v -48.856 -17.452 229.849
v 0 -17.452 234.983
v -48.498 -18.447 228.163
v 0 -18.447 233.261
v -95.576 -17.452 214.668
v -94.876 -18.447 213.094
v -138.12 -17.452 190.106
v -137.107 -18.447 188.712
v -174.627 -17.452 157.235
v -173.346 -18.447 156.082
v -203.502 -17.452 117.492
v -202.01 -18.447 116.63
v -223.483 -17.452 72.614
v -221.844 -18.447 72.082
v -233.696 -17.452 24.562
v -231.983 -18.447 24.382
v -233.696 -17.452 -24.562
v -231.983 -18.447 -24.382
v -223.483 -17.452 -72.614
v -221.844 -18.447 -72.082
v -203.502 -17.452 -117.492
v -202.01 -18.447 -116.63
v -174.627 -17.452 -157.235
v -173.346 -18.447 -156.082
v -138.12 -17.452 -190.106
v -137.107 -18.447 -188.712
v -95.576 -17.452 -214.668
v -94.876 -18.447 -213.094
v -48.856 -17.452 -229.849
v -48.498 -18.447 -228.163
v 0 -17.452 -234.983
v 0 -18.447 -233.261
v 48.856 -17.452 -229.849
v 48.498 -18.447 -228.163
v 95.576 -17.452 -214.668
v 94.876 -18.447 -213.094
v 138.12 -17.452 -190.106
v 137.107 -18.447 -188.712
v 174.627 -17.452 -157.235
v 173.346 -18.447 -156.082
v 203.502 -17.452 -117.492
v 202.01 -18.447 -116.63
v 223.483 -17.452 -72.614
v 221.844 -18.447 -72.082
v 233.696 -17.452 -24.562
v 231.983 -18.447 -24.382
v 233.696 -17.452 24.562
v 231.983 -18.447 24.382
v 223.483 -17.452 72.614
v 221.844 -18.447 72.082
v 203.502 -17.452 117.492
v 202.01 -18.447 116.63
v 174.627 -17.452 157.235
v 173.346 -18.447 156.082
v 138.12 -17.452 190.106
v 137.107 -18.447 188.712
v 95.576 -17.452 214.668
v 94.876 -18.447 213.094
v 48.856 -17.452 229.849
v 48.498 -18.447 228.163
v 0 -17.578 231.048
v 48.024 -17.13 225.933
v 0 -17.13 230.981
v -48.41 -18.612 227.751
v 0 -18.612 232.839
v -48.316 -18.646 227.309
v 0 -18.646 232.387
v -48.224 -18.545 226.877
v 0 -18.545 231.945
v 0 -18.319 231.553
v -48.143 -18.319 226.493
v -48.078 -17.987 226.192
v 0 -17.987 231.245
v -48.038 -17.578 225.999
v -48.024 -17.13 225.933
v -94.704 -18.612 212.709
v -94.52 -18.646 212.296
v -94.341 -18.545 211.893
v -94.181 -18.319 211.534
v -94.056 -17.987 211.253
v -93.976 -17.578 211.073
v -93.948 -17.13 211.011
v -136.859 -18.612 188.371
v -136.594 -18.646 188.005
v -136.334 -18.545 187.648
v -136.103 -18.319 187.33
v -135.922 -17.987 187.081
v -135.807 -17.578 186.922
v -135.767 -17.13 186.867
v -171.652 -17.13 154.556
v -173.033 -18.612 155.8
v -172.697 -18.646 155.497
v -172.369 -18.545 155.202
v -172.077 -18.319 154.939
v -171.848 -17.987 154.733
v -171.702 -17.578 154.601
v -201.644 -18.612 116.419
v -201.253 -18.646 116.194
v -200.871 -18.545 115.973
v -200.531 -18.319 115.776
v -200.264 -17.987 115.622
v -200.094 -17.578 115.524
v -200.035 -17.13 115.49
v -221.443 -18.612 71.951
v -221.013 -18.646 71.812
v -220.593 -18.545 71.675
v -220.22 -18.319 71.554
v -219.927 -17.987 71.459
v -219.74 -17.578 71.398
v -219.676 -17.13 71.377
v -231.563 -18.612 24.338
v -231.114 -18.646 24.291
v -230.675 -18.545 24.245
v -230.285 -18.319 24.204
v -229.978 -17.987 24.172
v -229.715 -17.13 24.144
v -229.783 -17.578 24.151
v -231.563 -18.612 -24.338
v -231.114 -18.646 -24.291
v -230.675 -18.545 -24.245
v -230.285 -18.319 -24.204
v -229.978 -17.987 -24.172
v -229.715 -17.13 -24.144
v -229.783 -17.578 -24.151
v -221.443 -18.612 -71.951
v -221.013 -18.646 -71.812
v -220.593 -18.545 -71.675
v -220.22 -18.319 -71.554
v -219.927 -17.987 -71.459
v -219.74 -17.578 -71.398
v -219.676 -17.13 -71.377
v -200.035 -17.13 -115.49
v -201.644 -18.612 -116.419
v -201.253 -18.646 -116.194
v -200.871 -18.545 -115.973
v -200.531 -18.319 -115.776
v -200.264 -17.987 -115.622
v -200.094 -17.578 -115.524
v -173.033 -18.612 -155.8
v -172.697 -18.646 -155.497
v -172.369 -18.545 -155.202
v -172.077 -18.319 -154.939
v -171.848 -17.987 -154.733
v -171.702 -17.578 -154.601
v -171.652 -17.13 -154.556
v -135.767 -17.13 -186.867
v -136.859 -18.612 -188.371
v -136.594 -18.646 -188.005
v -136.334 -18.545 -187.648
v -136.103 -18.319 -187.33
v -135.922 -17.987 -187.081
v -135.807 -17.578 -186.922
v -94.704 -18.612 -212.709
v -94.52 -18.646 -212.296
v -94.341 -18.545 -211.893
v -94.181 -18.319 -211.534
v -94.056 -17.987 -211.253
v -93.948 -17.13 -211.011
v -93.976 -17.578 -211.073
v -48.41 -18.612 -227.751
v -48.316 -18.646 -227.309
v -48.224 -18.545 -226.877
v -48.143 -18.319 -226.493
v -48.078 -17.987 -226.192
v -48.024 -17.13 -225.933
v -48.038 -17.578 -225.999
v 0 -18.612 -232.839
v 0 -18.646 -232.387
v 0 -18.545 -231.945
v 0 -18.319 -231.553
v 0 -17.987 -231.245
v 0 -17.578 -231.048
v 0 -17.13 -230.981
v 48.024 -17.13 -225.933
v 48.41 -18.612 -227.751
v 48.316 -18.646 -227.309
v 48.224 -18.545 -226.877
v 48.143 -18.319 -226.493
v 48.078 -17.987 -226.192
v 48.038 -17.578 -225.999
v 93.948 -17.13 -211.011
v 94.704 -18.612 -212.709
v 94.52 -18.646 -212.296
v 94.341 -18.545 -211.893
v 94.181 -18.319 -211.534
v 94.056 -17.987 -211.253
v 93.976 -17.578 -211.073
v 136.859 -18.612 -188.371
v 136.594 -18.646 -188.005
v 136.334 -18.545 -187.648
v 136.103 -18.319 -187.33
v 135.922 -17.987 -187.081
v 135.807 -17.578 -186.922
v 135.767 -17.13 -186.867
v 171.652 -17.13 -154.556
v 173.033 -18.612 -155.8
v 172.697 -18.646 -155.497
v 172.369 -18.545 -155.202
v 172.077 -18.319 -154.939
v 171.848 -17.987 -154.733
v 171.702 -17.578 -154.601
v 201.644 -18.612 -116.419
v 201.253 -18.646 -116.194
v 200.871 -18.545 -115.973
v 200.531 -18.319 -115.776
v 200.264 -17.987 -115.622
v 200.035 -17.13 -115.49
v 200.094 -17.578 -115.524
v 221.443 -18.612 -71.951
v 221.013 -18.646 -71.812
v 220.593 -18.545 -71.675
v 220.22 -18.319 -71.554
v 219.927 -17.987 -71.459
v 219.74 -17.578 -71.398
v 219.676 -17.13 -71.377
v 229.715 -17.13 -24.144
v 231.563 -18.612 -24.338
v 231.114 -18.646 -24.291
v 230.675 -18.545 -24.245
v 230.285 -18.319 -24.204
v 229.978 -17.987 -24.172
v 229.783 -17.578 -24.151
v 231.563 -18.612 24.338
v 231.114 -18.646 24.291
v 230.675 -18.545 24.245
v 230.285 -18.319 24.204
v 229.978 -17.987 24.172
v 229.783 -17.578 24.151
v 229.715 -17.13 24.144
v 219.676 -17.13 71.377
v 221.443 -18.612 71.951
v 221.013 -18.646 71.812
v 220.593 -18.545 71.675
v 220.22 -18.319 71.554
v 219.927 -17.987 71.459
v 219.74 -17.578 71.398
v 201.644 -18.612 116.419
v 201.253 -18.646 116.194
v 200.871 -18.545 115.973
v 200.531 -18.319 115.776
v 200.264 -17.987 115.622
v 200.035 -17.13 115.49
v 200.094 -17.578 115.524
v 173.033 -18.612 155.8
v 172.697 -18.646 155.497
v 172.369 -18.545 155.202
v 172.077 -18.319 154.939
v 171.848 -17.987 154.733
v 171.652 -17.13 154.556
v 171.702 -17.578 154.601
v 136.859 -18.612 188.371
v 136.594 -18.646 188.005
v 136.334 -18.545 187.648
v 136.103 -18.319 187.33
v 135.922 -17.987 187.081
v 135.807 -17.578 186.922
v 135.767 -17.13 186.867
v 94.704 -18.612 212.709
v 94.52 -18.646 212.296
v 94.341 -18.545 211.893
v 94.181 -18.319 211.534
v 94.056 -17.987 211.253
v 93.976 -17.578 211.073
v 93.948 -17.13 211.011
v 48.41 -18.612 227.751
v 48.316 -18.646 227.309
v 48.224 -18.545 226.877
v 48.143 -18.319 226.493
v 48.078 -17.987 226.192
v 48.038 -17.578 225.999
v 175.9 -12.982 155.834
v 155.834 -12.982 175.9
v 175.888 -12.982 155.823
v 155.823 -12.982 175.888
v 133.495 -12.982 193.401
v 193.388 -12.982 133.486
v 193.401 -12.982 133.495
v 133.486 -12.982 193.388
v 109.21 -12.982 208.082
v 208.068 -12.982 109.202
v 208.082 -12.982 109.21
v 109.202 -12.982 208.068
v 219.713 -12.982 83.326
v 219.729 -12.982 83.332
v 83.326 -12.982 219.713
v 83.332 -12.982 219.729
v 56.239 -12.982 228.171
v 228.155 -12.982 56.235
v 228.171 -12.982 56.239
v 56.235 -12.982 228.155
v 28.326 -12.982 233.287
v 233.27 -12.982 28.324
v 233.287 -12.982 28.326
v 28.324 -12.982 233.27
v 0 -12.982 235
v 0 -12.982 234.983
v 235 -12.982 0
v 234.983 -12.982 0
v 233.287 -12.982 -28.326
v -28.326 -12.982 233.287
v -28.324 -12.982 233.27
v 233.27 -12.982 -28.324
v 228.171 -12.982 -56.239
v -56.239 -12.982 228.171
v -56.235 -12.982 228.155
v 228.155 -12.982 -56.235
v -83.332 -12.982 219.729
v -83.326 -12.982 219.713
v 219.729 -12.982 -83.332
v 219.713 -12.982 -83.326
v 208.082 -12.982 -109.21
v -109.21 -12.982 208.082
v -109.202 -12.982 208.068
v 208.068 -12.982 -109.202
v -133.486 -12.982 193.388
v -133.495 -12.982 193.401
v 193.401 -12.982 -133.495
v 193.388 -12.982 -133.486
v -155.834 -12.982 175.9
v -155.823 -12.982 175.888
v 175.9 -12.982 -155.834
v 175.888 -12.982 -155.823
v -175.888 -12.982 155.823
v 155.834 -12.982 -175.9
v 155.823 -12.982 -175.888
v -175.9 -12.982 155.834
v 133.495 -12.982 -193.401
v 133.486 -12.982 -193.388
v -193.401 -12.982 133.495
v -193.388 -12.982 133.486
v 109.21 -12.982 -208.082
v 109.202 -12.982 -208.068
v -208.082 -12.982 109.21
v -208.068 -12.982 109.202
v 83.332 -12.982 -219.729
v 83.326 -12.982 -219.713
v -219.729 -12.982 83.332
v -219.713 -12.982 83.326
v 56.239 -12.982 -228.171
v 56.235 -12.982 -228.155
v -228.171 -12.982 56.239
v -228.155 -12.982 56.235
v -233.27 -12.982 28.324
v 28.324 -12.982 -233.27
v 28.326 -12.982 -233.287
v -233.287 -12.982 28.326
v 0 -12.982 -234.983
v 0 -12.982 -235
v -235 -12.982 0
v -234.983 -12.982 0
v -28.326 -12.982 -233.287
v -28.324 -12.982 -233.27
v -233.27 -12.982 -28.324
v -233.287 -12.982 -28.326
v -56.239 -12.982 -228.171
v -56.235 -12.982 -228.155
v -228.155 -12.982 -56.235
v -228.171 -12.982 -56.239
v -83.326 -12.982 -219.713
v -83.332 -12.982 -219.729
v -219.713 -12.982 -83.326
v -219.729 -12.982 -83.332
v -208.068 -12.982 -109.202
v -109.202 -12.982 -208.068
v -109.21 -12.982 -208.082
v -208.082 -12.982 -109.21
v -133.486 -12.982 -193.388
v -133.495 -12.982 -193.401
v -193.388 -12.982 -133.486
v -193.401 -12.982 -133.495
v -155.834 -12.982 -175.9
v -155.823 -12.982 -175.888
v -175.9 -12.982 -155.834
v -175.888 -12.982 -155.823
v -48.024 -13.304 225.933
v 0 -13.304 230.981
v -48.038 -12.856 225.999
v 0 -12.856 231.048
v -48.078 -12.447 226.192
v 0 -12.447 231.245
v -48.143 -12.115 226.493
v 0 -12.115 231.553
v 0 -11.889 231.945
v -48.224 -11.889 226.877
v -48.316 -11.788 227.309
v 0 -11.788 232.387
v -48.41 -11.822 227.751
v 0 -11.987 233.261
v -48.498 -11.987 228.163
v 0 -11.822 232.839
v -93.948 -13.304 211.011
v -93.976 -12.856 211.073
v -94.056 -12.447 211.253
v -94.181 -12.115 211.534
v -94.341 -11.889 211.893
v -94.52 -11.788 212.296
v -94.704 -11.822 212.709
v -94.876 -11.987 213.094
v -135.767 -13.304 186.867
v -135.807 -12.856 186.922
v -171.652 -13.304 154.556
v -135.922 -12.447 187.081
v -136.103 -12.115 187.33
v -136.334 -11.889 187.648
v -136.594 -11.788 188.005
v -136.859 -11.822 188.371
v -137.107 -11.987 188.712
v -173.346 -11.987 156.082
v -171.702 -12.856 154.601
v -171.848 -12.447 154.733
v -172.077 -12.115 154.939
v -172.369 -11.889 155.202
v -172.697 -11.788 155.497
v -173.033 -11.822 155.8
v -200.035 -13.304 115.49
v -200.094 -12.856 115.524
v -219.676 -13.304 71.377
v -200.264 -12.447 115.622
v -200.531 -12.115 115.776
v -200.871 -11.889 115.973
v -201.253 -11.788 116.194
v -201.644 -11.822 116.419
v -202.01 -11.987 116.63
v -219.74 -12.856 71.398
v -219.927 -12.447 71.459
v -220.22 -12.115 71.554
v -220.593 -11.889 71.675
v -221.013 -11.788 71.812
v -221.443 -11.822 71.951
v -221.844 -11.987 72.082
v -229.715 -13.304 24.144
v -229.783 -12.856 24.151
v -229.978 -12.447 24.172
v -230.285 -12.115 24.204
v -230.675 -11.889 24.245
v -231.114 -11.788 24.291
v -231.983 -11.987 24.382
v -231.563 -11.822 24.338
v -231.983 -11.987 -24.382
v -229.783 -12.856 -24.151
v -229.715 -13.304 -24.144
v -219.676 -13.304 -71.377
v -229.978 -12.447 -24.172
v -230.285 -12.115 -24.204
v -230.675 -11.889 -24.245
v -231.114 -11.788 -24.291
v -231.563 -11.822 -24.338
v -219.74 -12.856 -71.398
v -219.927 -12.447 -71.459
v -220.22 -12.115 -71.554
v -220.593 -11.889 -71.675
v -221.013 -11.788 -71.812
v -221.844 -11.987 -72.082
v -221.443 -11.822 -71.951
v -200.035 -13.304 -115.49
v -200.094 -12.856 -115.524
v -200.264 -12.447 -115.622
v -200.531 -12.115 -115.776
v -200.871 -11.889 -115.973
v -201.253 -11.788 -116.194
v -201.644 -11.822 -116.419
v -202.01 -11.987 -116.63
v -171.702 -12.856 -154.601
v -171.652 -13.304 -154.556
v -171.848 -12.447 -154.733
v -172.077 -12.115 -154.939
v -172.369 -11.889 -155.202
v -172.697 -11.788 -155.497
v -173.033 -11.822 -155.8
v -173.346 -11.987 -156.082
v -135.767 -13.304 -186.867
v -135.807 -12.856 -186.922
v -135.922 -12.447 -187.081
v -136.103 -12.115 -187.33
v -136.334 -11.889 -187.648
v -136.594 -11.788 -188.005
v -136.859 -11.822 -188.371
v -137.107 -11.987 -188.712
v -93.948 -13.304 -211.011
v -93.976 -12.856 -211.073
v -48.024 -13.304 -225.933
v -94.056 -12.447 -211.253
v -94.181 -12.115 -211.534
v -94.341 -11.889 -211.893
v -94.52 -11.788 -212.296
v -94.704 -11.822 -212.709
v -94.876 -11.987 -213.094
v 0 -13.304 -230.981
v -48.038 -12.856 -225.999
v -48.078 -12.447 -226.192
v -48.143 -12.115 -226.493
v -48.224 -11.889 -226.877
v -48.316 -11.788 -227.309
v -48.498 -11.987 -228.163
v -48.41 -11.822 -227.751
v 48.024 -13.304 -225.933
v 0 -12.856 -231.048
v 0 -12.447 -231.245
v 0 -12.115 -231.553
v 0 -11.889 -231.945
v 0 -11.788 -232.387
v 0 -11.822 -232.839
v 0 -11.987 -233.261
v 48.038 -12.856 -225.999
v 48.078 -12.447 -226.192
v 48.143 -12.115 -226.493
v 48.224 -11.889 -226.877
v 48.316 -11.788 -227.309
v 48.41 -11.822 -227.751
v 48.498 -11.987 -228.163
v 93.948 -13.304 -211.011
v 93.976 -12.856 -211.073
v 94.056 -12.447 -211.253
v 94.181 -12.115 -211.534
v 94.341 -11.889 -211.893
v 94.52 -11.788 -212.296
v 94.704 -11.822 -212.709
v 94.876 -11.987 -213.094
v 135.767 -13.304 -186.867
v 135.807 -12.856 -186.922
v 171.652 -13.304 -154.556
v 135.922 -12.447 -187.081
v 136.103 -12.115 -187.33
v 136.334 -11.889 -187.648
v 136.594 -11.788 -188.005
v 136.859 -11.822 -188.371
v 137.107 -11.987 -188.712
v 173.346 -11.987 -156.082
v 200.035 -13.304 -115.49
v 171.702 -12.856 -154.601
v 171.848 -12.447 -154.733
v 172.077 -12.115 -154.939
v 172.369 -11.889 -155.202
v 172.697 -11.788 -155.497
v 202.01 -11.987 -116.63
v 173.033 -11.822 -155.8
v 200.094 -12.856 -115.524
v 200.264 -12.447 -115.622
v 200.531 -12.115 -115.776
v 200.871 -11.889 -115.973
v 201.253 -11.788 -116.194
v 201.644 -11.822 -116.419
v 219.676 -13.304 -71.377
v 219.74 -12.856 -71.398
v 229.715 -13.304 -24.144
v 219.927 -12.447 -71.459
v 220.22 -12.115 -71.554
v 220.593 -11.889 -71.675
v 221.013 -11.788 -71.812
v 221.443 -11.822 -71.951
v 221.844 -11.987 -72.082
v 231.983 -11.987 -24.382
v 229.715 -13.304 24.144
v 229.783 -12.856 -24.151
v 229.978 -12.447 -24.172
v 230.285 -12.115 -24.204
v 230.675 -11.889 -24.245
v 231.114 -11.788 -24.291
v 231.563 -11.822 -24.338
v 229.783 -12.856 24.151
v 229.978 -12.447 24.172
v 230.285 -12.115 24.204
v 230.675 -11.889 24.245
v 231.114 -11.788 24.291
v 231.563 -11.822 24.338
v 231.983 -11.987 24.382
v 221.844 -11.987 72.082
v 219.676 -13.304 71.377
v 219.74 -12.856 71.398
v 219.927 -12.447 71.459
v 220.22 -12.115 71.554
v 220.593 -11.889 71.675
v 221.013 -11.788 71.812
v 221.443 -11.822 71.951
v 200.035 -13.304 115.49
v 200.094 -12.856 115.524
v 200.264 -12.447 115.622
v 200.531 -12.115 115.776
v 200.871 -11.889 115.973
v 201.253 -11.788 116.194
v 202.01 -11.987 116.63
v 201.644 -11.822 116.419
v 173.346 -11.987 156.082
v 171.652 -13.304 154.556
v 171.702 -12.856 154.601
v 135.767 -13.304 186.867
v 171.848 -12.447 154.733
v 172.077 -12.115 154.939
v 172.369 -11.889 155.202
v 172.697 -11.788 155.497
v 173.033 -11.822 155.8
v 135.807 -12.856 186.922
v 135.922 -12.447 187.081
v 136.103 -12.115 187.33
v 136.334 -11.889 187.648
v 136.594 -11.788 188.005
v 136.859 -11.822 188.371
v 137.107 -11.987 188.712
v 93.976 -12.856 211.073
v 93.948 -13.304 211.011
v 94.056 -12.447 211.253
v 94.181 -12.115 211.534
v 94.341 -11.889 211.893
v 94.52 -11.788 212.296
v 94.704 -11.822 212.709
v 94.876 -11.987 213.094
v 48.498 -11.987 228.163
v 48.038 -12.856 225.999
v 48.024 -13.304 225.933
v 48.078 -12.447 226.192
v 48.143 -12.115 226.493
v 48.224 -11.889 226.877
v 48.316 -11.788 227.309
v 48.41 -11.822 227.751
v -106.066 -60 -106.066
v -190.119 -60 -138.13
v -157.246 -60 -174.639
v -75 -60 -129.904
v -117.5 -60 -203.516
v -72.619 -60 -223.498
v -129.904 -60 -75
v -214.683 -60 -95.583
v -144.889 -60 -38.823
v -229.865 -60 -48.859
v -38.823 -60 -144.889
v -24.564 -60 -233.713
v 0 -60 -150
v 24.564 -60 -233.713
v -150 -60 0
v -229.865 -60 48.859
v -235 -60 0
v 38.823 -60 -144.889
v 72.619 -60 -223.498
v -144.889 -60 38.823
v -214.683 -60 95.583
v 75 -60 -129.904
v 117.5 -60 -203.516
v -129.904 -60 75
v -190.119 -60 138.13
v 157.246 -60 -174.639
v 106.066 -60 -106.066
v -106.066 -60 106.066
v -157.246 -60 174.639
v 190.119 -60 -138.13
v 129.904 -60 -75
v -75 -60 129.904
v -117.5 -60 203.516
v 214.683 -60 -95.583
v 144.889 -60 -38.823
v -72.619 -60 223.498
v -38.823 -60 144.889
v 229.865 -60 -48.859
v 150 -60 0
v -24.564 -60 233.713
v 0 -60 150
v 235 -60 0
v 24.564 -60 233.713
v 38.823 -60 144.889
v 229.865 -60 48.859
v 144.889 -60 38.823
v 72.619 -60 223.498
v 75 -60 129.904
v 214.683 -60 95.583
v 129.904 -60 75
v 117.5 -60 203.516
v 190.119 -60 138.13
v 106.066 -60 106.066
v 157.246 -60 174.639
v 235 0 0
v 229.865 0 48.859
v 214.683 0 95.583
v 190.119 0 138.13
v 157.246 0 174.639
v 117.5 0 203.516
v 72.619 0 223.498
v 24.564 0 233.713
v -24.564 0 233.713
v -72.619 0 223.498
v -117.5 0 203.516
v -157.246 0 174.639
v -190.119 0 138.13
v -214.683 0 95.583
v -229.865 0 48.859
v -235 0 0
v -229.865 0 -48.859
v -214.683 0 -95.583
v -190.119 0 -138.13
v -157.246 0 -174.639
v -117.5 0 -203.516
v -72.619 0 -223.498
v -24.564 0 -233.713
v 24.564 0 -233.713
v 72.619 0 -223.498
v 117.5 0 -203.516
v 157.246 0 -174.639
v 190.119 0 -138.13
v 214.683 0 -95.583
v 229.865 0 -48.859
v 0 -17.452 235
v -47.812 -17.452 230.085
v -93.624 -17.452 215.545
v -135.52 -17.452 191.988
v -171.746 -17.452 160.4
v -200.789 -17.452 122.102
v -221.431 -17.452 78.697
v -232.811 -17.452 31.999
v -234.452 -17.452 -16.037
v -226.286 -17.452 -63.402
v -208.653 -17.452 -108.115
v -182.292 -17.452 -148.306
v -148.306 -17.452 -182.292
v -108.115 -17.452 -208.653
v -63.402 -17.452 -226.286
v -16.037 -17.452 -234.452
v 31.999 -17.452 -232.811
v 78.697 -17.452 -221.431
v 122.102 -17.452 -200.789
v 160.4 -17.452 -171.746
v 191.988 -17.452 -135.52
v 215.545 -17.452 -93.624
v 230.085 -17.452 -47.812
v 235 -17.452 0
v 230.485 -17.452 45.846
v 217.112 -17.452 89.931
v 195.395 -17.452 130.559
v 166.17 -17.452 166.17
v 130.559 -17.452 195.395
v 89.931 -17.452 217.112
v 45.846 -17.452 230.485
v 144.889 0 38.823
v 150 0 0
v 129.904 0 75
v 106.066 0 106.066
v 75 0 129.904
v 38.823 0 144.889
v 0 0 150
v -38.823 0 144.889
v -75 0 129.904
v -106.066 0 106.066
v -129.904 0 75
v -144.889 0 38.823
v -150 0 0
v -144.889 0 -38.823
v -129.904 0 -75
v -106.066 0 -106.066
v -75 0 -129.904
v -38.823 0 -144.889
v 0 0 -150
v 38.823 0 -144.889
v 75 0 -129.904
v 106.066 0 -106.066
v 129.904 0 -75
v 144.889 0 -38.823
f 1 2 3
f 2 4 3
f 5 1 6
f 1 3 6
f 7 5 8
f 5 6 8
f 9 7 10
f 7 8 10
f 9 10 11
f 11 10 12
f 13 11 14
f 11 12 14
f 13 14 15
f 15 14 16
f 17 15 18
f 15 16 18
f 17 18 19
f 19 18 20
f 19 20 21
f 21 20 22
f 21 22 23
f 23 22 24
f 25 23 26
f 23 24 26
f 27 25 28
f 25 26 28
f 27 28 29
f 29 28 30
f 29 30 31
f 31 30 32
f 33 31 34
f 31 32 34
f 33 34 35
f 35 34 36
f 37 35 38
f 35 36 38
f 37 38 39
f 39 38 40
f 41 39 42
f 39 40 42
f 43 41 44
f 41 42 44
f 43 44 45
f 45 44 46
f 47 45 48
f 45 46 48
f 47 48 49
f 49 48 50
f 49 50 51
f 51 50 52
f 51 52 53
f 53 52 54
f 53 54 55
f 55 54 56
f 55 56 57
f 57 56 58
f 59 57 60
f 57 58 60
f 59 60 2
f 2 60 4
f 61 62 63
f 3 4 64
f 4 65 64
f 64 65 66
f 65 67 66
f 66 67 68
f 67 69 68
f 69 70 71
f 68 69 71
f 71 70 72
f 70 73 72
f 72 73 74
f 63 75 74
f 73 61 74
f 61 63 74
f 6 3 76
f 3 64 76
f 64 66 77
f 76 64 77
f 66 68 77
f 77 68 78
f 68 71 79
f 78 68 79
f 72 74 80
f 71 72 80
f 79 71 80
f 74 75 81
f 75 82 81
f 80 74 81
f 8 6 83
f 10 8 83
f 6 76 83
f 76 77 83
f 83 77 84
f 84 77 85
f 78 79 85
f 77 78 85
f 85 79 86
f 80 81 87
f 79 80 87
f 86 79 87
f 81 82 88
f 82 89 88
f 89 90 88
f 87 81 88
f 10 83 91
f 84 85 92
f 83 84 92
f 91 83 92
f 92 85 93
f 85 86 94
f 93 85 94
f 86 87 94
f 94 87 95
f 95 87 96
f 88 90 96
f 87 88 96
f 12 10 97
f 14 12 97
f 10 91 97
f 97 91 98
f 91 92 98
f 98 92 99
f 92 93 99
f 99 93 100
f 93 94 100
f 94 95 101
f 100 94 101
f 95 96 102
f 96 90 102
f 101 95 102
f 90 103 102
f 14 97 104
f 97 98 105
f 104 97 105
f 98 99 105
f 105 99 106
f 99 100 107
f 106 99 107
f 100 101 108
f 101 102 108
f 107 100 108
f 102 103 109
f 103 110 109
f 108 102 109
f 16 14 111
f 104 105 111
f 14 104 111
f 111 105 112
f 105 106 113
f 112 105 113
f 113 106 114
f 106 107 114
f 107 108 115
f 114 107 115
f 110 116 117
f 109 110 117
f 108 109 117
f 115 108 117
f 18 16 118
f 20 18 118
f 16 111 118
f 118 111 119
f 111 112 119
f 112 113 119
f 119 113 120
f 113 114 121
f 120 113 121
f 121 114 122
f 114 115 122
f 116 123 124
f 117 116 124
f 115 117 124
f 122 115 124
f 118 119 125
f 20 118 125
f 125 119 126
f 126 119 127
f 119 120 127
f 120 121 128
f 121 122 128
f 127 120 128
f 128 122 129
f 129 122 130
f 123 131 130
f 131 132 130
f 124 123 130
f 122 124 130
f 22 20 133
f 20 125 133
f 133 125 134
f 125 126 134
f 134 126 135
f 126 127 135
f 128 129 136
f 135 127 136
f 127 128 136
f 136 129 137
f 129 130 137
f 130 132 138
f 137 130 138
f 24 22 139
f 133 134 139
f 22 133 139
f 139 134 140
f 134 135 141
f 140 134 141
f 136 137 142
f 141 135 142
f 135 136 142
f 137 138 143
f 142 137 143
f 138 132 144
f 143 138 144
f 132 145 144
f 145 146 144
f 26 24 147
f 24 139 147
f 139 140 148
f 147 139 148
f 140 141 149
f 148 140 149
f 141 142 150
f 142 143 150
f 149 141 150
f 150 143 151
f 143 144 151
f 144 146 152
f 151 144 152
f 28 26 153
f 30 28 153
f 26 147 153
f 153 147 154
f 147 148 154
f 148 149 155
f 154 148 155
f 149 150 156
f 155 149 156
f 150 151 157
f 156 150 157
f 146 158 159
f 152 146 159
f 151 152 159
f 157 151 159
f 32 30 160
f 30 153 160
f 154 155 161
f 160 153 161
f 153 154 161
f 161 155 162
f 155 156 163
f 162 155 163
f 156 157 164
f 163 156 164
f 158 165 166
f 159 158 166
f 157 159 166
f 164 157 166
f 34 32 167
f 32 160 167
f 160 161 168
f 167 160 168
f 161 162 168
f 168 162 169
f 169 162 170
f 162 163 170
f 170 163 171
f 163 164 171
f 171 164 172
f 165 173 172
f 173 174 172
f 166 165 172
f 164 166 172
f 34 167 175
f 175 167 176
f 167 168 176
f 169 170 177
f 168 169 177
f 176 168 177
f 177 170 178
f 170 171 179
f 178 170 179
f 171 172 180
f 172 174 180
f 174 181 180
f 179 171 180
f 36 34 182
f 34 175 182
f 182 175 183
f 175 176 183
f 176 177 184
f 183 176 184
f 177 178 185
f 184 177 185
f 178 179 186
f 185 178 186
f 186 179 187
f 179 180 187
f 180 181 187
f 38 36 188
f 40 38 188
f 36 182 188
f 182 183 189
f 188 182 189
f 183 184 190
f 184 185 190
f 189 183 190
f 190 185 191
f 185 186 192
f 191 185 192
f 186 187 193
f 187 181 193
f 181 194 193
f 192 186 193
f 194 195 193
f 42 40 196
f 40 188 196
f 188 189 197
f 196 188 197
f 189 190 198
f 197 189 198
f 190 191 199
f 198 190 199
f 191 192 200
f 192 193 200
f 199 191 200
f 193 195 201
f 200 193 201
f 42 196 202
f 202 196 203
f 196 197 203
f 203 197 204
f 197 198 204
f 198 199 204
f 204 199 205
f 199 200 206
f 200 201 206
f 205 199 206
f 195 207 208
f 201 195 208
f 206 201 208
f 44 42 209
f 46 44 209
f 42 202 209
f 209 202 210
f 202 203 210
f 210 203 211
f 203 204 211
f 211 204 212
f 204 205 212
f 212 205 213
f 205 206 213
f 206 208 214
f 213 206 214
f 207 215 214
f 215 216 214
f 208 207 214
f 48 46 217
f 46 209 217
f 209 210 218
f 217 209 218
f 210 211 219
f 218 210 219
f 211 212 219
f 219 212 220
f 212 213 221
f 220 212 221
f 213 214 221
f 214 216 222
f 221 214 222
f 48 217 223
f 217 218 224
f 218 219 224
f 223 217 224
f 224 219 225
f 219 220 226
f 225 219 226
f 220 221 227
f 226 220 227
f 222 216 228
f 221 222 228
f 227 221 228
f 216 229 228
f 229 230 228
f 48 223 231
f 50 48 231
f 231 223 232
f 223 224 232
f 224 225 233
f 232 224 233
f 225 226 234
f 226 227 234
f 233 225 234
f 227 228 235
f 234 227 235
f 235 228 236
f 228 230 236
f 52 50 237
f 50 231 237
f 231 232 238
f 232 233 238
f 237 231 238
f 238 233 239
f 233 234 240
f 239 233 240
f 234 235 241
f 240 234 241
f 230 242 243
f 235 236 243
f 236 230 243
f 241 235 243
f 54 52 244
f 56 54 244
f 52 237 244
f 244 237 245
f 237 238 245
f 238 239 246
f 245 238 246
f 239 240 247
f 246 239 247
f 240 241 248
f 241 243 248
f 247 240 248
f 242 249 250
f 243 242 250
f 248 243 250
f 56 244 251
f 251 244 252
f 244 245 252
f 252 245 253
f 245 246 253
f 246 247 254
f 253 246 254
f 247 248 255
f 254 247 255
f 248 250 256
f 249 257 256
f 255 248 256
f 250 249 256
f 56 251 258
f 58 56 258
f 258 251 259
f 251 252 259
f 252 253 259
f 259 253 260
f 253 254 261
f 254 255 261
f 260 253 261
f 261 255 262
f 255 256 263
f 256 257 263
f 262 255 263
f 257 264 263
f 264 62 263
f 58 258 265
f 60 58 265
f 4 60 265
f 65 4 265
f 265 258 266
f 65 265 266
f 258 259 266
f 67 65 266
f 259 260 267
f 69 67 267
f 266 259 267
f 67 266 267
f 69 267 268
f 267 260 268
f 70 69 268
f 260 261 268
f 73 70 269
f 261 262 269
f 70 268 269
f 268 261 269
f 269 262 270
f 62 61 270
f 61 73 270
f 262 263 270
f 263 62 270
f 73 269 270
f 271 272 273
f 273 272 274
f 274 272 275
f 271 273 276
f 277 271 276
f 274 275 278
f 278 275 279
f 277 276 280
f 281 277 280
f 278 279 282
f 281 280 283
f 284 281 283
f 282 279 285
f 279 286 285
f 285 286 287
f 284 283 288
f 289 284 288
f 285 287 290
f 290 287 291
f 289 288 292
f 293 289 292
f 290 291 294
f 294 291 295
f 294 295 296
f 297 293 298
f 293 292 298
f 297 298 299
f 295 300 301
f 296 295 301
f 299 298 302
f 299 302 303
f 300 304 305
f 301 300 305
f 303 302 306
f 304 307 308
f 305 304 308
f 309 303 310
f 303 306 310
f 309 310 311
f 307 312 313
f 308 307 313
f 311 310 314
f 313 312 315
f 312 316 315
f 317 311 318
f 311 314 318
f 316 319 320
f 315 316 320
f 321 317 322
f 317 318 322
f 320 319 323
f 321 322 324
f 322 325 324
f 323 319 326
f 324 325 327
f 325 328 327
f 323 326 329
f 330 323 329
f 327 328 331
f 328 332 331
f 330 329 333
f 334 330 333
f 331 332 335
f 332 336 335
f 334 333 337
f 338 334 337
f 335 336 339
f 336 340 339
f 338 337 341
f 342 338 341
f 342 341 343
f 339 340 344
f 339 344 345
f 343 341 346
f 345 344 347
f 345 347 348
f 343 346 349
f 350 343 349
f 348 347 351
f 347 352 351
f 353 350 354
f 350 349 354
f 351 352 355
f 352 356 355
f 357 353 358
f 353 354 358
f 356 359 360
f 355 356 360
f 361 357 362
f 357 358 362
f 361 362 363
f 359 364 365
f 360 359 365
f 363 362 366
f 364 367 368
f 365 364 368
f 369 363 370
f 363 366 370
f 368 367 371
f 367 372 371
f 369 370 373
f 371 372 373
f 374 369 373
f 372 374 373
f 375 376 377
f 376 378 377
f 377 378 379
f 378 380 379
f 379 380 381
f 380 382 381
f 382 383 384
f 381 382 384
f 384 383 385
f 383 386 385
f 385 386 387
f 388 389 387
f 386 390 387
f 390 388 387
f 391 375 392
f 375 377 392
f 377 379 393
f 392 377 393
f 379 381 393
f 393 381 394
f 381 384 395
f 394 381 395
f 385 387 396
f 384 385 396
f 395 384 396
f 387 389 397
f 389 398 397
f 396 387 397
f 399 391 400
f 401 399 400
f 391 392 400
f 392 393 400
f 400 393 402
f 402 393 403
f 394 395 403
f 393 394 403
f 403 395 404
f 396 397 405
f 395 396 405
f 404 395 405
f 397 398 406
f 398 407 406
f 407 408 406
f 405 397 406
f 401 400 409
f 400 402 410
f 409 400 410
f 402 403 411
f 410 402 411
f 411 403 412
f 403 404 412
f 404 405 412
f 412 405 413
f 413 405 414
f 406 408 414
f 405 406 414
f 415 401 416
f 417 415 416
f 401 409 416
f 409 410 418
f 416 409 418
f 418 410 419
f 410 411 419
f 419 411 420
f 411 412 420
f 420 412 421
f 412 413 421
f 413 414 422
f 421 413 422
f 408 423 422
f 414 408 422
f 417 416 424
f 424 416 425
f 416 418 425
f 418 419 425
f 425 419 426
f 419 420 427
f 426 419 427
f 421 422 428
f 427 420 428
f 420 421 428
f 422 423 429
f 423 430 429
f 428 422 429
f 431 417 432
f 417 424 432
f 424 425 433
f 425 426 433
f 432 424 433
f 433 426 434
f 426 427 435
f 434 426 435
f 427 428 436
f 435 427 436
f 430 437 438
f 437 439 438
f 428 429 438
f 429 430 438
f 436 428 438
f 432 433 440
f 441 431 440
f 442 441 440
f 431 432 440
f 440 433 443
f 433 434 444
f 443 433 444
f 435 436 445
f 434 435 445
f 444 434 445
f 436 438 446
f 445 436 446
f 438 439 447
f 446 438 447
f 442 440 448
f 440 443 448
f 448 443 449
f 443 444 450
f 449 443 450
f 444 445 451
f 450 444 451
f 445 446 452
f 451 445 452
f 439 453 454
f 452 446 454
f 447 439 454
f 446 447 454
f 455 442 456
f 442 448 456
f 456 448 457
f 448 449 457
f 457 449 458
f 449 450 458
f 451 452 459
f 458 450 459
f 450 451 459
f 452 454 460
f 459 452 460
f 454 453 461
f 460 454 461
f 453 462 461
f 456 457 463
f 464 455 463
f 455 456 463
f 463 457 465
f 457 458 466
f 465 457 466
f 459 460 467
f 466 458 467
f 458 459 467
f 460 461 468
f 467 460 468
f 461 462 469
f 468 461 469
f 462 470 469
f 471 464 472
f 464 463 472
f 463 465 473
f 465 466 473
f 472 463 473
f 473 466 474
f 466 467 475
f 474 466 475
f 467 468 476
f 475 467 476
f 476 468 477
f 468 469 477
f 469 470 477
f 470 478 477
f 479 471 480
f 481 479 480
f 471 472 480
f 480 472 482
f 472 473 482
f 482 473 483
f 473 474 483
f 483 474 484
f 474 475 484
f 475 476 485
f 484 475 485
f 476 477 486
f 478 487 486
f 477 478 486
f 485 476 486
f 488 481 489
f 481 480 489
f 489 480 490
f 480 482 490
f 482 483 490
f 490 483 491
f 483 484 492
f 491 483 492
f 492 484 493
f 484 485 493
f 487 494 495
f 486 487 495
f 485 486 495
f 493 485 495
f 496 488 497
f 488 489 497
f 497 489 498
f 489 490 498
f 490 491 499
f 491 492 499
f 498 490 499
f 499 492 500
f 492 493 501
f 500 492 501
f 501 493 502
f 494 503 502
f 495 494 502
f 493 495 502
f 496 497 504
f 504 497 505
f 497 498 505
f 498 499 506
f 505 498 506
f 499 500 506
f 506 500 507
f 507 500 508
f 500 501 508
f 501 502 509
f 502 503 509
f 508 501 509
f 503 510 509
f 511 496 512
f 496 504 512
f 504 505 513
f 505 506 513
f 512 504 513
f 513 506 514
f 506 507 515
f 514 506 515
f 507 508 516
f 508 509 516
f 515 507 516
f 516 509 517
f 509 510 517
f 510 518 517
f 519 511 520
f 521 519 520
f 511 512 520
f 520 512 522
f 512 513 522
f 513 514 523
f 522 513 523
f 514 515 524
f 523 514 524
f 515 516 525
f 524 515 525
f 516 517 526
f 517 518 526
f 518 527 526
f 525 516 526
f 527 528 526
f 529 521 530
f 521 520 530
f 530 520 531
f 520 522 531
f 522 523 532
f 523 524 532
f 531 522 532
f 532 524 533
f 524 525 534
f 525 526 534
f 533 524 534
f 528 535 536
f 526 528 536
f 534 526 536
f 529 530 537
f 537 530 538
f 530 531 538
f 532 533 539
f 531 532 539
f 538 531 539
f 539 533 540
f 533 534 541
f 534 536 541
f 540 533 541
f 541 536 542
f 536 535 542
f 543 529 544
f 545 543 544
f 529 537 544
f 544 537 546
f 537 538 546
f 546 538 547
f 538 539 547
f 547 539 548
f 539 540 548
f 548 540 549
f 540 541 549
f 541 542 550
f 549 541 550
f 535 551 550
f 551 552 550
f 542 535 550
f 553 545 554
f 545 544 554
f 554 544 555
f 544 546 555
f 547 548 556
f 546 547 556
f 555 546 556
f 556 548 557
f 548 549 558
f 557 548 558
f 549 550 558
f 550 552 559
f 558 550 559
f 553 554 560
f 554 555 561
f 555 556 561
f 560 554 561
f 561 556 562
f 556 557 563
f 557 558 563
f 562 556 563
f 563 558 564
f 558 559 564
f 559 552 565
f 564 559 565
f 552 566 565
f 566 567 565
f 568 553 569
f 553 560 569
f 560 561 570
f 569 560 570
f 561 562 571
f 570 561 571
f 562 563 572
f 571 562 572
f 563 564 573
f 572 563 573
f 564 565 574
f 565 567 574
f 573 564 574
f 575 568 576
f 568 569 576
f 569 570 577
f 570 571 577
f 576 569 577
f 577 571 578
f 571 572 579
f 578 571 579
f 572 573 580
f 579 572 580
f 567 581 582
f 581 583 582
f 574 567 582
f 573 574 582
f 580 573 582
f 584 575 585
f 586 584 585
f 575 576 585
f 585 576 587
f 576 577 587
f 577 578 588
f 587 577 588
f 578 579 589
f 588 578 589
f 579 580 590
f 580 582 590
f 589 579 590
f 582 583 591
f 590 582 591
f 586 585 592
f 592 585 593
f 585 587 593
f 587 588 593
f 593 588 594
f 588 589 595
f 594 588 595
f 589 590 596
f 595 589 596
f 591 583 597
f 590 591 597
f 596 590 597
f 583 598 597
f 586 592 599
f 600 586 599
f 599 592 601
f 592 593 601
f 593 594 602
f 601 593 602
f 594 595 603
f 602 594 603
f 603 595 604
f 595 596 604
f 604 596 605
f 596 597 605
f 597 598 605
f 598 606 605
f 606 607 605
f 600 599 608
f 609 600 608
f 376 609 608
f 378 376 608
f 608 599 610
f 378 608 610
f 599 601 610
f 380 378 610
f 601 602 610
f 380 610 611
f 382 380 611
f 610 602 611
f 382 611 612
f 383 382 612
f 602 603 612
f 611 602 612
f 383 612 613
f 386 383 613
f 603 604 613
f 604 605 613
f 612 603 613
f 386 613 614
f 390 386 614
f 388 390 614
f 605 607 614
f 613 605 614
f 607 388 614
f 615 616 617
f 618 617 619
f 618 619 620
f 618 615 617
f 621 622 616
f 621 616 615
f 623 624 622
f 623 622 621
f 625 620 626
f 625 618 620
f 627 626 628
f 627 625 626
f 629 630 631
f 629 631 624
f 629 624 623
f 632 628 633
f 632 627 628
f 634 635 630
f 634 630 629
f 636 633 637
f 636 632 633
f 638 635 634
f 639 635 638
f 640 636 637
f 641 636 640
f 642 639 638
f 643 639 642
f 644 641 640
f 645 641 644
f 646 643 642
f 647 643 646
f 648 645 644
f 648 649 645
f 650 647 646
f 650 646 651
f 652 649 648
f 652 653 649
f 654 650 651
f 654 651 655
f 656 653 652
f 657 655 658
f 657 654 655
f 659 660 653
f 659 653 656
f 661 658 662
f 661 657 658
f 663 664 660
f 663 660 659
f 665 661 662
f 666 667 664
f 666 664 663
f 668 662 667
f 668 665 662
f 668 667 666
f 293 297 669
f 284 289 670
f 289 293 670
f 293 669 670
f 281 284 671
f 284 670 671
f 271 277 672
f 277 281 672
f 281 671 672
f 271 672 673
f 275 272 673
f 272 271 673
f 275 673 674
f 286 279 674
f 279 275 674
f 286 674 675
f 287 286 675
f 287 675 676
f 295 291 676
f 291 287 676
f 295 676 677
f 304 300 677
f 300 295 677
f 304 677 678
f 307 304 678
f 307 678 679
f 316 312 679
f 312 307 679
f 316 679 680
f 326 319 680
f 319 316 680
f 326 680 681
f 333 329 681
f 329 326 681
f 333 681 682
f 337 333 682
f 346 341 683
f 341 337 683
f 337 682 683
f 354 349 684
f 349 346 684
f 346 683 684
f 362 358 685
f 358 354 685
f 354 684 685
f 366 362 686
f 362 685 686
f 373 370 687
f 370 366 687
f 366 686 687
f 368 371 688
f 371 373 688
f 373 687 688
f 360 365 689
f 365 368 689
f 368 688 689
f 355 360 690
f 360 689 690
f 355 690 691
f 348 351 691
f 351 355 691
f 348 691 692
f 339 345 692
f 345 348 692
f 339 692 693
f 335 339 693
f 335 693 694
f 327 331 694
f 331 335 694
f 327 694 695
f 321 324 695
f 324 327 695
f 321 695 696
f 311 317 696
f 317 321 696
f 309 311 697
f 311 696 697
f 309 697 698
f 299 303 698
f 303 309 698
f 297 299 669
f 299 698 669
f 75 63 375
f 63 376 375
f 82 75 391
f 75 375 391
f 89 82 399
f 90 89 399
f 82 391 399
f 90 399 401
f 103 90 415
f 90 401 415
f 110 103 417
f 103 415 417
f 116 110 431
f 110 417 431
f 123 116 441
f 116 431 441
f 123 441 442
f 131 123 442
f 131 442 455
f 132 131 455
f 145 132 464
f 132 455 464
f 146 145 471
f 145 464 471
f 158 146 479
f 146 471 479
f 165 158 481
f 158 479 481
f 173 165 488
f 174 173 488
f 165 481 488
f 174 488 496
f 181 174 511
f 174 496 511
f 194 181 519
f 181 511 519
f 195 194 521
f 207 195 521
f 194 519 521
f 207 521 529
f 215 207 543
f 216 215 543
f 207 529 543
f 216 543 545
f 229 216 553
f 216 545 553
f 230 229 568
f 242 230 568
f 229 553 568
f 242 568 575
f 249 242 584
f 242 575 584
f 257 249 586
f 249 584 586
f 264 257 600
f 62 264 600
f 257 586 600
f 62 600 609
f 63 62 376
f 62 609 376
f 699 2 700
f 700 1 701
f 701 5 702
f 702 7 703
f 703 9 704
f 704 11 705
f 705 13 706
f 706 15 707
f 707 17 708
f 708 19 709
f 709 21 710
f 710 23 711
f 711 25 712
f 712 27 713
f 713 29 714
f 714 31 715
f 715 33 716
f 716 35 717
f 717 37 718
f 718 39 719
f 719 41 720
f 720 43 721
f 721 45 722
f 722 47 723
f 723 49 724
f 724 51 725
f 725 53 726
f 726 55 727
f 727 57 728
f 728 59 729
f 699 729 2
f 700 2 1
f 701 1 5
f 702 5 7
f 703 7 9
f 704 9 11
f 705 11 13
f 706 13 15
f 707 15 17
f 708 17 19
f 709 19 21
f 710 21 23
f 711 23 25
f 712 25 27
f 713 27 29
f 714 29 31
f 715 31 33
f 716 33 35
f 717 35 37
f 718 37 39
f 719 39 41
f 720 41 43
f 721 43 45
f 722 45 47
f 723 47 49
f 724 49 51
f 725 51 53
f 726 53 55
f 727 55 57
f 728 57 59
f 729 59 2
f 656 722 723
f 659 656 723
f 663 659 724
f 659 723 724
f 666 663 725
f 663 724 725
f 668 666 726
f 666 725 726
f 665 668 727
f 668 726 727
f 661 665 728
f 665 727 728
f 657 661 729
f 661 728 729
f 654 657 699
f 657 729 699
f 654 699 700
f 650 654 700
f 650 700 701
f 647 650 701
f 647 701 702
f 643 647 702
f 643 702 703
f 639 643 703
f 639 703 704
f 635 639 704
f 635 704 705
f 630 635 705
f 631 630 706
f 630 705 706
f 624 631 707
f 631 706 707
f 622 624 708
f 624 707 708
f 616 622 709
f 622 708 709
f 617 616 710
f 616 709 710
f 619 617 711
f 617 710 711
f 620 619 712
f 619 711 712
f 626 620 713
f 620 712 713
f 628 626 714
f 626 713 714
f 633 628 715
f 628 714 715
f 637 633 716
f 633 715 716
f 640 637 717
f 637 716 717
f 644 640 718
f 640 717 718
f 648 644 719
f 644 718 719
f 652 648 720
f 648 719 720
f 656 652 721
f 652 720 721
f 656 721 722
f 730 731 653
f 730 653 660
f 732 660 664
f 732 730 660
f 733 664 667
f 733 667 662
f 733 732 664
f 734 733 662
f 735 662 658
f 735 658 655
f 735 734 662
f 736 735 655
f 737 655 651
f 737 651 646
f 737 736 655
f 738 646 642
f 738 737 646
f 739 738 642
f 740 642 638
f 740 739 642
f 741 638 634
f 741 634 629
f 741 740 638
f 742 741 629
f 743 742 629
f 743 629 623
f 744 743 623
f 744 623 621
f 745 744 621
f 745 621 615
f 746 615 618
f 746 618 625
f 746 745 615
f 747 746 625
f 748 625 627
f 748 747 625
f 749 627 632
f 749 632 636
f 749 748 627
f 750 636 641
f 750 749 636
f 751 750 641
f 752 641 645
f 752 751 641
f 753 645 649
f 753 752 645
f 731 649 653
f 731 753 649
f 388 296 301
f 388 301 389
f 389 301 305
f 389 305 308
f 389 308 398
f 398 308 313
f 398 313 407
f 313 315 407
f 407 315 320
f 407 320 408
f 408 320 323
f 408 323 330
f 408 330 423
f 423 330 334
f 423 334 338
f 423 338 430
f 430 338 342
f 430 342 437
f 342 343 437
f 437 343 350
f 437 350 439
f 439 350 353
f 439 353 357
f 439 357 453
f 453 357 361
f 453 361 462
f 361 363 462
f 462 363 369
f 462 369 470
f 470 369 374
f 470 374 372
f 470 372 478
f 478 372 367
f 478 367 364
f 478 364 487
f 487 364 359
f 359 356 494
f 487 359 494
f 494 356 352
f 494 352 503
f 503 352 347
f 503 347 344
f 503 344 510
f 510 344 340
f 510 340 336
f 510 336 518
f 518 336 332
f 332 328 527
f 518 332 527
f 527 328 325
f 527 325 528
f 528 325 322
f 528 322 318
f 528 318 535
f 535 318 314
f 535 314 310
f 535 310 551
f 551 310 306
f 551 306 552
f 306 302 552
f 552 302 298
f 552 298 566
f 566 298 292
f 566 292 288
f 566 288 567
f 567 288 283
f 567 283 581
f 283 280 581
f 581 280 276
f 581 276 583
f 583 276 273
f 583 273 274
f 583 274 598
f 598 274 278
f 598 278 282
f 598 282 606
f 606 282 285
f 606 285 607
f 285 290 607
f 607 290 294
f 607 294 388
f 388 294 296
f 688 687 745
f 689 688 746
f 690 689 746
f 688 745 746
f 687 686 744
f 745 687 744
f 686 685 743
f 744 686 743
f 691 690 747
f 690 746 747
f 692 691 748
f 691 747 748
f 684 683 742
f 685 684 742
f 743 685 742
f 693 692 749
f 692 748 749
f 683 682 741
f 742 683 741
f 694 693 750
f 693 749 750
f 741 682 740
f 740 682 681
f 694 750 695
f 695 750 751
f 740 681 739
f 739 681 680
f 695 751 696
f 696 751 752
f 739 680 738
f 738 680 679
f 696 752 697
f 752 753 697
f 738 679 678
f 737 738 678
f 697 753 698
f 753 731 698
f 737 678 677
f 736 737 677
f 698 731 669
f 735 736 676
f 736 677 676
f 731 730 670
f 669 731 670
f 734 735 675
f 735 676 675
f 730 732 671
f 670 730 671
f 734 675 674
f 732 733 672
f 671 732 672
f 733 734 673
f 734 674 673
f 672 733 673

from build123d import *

# Parameters (mm, degrees)
F0_R     = 235
F0_R_2   = 150
F1_DEPTH = 60


with BuildPart() as f1:
    # F0 (on Front) → F1 (new body)
    with BuildSketch(Plane.XZ):
        Circle(F0_R)
        Circle(F0_R_2, mode=Mode.SUBTRACT)
    extrude(amount=F1_DEPTH)

    # F2 (on Right) → F3 (revolve, cut)
    with BuildSketch(Plane.YZ):
        with BuildLine():
            Line((-17.486282, 236.367822), (-17.452006, 234.98348))
            Line((-17.452006, 234.98348), (-18.446662, 233.260686))
            ThreePointArc((-18.446662, 233.260686), (-18.446662, 231.740686), (-17.130303, 230.980686))
            Line((-17.130303, 230.980686), (-15.217006, 230.980686))
            Line((-15.217006, 230.980686), (-13.303709, 230.980686))
            ThreePointArc((-13.303709, 230.980686), (-11.98735, 231.740686), (-11.98735, 233.260686))
            Line((-11.98735, 233.260686), (-12.982006, 234.98348))
            Line((-12.982006, 234.98348), (-12.982006, 236.367822))
            Line((-12.982006, 236.367822), (-17.486282, 236.367822))
        make_face()
    revolve(axis=Axis((0, -68.413801, 0), (0, -1, 0)), mode=Mode.SUBTRACT)


solid = f1.part
